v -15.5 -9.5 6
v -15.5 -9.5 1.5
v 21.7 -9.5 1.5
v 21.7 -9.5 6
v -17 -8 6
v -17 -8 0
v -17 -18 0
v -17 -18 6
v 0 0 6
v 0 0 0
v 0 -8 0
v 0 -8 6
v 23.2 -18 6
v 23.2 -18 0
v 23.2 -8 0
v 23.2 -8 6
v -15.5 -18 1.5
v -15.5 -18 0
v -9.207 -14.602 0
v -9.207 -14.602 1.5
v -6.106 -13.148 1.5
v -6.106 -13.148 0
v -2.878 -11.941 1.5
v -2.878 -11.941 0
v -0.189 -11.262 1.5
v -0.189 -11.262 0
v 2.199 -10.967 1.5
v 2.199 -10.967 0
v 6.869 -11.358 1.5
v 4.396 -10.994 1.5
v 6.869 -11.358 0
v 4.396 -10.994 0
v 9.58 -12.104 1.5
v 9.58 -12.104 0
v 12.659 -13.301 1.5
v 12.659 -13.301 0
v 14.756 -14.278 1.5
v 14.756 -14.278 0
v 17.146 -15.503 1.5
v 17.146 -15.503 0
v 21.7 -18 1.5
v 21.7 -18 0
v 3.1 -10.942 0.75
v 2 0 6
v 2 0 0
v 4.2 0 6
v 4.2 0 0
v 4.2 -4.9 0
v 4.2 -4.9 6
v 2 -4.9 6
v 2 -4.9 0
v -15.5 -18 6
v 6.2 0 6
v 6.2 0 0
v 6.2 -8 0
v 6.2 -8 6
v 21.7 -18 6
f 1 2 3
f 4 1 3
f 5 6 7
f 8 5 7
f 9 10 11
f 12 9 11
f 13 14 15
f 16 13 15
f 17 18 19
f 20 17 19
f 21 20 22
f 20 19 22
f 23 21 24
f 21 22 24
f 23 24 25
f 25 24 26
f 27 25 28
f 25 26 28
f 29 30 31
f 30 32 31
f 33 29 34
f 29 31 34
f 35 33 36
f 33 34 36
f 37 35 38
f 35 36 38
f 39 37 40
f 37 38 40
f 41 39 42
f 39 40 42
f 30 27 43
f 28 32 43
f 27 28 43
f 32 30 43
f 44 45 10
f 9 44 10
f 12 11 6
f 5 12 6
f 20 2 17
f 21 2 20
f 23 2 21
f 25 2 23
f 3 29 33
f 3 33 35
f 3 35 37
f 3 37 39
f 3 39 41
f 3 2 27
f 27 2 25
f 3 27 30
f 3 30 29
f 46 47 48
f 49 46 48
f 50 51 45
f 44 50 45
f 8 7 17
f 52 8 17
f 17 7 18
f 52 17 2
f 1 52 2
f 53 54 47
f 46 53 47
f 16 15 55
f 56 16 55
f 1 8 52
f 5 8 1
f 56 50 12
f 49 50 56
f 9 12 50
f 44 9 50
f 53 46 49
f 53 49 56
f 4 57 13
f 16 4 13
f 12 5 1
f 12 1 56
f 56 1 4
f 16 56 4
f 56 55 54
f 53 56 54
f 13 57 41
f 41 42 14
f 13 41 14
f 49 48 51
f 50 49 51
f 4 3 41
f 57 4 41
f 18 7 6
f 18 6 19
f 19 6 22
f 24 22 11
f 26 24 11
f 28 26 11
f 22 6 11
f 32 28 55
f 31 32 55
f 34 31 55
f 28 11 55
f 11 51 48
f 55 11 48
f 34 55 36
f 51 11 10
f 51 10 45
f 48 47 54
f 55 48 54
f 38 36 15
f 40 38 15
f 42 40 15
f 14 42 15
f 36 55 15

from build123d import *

# Parameters (mm, degrees)
F1_DEPTH = 6
F2_DEPTH = 1.5


with BuildPart() as f1:
    # F0 (on Top) → F1 (new body)
    with BuildSketch(Plane.XY):
        Polygon((2, 0), (0, 0), (0, -8), (-17, -8), (-17, -18), (-15.5, -18), (-15.5, -9.5), (21.7, -9.5), (21.7, -18), (23.2, -18), (23.2, -8), (6.2, -8), (6.2, 0), (4.2, 0), (4.2, -4.9), (2, -4.9), align=None)
    extrude(amount=F1_DEPTH)

    # F0 (on Top) → F2 (join)
    with BuildSketch(Plane.XY):
        with BuildLine():
            Line((-15.5, -9.5), (-15.5, -18))
            add(Edge.make_bspline(
                [(-15.5, -18), (-9.133333, -14.471125), (3.1, -7.413374), (15.333333, -14.471125), (21.7, -18)],
                knots=[0, 0, 0, 0, 19.894015, 39.78803, 39.78803, 39.78803, 39.78803], degree=3))
            Line((21.7, -18), (21.7, -9.5))
            Line((21.7, -9.5), (-15.5, -9.5))
        make_face()
    extrude(amount=F2_DEPTH)


solid = f1.part
